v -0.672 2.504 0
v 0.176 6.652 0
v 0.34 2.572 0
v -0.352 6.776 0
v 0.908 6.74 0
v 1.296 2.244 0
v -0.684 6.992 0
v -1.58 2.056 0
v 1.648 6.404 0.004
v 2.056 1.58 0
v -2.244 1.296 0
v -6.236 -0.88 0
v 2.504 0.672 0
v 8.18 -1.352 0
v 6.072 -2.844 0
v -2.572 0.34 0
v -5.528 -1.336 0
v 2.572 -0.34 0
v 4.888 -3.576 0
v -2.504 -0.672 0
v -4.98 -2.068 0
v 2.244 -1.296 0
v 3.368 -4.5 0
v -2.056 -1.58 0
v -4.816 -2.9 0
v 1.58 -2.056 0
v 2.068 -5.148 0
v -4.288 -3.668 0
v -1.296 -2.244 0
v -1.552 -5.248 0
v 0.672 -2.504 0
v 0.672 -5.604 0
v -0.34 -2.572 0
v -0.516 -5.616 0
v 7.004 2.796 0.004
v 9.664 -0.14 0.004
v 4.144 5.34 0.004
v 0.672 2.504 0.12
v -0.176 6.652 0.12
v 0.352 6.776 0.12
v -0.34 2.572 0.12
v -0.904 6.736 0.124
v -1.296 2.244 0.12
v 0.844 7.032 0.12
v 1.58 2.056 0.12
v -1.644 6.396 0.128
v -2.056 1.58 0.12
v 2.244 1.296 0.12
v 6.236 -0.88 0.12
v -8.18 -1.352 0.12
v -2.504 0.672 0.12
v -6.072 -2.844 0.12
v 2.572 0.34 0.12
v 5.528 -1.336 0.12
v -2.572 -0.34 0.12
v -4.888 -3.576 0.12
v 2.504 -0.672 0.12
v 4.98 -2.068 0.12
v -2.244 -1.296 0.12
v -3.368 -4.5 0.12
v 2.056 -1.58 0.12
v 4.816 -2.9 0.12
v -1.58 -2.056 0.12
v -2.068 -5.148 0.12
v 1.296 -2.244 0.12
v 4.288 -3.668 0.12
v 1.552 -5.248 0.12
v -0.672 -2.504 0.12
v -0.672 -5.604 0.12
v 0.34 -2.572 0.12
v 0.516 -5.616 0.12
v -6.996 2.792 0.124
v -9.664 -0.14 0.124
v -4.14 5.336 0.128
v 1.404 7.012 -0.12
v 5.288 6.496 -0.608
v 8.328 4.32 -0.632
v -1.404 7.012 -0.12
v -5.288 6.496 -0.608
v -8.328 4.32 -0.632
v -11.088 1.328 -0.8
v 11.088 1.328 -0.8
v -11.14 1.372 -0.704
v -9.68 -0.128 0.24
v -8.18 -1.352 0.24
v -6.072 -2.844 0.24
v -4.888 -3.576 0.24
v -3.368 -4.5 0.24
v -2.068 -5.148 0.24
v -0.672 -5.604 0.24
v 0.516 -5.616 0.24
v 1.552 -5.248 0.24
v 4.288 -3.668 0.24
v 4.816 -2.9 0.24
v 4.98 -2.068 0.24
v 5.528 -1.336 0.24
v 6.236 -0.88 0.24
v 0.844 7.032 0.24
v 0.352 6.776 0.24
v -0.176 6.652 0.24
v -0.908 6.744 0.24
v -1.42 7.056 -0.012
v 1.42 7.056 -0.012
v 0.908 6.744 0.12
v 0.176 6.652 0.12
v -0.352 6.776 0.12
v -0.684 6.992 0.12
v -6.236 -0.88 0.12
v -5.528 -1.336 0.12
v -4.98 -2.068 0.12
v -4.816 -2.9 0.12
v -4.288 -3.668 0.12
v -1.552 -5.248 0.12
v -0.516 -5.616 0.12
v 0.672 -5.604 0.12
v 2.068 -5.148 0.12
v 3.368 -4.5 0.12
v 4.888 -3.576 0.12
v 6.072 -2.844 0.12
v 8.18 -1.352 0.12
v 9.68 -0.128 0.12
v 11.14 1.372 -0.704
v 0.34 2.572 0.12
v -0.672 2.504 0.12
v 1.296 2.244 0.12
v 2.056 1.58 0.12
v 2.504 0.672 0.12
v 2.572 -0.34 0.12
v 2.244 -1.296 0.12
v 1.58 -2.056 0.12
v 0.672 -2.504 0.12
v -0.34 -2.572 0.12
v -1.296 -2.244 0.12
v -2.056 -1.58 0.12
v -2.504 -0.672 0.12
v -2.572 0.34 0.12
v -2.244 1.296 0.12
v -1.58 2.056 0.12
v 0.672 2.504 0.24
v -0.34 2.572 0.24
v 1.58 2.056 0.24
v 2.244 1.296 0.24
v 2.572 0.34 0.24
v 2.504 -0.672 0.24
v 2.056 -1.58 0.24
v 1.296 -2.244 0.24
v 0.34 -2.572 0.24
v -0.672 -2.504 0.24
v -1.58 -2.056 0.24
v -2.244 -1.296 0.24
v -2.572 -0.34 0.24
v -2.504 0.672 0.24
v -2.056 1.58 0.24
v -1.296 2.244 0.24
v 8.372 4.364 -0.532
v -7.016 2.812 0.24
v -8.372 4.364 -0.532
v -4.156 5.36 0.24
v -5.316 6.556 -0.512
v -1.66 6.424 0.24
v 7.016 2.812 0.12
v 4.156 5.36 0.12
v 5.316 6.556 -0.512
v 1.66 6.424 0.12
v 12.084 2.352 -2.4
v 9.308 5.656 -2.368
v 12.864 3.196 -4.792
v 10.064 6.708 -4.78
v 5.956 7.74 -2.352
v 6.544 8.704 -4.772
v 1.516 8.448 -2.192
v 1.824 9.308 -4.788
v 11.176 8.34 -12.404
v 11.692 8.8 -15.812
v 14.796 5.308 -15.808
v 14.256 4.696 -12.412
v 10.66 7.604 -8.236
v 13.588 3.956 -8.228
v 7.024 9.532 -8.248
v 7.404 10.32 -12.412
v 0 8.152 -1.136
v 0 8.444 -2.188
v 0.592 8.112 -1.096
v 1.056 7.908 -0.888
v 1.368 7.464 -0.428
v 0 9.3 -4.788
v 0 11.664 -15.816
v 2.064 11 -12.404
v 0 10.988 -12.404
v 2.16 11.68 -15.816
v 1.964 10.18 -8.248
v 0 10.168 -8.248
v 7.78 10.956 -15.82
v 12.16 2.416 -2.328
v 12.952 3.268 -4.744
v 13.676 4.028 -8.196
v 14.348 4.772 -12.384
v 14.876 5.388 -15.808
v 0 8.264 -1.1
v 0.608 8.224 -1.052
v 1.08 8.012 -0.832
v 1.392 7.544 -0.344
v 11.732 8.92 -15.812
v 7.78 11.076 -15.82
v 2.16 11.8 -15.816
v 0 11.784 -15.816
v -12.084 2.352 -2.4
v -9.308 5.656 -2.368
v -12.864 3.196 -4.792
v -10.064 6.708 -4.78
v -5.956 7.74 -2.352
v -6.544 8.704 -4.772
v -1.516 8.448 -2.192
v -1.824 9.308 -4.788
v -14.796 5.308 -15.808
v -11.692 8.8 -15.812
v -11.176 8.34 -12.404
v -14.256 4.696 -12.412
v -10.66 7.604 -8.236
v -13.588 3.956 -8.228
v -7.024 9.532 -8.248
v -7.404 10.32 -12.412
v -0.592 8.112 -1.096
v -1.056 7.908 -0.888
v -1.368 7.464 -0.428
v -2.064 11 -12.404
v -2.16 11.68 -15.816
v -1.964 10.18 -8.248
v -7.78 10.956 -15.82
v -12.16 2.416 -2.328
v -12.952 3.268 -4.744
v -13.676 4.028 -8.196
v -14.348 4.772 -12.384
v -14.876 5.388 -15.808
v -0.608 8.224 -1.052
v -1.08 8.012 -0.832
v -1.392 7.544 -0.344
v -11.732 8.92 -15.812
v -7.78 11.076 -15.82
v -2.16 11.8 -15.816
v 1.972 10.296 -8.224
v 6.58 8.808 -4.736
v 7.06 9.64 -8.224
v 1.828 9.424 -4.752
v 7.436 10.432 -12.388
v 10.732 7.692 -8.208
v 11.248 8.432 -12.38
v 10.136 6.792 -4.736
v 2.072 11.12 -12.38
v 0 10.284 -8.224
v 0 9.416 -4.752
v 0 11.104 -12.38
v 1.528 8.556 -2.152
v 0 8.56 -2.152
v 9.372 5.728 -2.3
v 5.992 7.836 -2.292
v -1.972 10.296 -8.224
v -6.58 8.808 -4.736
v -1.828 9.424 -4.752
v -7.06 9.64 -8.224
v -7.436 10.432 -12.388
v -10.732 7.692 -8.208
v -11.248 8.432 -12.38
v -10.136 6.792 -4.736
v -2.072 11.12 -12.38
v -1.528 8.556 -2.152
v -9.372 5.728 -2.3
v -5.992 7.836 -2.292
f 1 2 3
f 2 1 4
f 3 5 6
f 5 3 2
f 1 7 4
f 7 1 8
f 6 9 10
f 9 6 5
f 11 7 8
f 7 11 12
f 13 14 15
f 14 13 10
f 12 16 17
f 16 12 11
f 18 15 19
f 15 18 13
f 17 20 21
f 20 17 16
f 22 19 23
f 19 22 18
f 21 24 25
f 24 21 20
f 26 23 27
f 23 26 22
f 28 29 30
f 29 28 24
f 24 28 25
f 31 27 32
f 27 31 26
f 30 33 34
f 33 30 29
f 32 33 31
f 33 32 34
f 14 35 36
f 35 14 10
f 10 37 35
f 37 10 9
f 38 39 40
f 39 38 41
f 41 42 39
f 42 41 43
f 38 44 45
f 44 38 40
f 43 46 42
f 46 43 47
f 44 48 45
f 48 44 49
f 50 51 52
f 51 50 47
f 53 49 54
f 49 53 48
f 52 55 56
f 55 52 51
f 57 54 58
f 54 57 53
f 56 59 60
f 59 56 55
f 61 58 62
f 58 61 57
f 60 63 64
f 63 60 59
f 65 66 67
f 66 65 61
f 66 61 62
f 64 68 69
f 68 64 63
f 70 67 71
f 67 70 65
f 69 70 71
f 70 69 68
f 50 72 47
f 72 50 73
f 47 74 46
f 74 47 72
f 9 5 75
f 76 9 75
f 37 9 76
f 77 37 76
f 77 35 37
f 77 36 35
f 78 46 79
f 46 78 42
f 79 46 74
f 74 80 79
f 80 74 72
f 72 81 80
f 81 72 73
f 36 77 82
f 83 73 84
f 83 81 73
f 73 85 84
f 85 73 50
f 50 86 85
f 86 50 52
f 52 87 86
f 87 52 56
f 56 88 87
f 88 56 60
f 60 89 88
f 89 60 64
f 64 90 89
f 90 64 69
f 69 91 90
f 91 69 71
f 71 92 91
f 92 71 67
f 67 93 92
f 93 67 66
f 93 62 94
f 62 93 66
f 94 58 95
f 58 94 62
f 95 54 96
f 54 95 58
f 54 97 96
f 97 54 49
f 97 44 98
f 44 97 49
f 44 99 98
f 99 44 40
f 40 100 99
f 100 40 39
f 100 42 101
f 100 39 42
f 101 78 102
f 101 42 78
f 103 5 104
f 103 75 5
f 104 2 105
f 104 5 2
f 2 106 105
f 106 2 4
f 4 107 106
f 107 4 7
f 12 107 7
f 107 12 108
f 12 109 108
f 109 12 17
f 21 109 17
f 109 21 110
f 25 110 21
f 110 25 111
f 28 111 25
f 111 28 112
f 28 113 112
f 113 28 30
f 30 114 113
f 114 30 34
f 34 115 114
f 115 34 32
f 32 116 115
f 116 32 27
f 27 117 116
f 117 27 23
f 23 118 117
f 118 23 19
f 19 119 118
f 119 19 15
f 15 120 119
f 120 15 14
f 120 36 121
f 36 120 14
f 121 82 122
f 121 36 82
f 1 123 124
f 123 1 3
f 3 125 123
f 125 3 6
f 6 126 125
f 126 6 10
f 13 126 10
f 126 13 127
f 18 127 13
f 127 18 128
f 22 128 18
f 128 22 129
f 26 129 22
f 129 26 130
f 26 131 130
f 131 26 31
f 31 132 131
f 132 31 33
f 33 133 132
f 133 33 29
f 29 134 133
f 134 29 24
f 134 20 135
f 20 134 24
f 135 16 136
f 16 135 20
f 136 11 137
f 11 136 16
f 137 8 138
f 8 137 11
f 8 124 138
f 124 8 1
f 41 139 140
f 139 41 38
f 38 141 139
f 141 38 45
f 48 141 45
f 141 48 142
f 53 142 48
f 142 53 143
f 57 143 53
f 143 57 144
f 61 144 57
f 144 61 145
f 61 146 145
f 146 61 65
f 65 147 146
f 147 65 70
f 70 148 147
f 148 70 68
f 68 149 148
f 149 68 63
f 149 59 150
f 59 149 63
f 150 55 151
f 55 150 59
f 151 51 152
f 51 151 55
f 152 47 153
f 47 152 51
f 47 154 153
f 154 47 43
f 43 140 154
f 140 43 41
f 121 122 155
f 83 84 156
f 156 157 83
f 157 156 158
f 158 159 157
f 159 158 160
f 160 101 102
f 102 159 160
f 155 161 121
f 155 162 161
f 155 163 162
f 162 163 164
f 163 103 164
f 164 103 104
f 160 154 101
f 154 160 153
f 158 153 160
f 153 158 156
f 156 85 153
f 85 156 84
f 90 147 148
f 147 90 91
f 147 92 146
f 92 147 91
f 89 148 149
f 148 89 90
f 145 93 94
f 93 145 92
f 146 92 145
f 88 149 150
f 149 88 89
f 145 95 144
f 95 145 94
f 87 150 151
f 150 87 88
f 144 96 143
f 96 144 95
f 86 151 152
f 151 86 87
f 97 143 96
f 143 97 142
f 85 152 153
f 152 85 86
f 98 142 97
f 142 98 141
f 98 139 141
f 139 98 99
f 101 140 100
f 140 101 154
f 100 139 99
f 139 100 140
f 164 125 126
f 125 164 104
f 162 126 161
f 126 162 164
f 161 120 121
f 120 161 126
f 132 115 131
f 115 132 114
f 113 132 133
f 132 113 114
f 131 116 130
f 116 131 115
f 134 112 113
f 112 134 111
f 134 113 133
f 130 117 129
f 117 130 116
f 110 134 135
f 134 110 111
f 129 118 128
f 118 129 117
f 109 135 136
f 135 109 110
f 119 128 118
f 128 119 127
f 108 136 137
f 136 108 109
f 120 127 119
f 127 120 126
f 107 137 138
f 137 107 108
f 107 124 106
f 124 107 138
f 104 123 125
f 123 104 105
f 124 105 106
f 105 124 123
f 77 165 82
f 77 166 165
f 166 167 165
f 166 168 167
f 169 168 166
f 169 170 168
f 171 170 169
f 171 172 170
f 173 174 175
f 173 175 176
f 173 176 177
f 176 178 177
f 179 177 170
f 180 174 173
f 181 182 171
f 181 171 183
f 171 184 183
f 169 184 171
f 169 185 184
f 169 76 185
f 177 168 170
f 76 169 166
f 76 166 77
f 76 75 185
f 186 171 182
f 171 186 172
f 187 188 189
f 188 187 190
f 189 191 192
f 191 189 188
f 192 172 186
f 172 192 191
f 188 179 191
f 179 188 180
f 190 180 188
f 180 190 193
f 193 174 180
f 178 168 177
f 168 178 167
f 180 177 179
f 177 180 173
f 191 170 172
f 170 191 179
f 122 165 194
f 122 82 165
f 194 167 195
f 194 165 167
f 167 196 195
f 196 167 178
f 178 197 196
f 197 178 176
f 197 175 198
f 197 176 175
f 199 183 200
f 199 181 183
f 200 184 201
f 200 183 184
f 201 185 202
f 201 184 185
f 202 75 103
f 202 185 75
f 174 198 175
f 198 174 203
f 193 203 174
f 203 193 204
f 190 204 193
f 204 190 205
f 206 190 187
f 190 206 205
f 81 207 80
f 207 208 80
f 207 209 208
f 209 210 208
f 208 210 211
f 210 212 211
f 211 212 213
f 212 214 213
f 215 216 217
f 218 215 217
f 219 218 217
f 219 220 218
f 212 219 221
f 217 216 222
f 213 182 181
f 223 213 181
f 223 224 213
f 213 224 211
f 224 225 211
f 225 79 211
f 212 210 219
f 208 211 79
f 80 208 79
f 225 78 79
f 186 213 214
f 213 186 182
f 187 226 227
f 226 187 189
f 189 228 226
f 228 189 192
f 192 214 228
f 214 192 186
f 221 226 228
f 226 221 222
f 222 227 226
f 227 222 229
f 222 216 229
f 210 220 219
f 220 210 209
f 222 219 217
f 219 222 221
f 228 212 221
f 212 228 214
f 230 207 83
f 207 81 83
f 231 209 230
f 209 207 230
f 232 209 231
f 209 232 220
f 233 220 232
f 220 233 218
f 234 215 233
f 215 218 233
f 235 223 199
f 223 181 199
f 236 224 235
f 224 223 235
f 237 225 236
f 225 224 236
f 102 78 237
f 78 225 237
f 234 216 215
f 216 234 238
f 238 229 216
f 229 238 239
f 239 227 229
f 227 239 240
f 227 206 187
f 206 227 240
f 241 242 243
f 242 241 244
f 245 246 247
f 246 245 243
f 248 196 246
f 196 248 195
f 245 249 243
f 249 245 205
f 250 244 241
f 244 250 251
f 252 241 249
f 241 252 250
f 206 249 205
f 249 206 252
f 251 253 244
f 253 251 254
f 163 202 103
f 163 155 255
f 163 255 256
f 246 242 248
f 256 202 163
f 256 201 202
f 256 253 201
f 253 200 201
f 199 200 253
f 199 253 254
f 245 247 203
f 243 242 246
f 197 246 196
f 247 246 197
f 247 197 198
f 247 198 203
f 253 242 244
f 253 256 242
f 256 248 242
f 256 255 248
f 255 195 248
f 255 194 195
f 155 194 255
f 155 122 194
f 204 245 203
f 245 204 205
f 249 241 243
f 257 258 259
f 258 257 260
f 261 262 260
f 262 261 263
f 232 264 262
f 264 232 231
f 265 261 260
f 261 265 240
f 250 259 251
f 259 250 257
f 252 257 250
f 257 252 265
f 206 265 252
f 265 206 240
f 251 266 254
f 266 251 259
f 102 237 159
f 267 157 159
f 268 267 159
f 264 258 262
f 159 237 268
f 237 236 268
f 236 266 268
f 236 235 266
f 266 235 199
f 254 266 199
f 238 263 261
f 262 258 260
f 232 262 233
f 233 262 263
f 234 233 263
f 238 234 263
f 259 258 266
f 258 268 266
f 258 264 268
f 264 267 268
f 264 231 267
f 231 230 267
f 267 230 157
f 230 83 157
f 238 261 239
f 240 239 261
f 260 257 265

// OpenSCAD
use <../lib.scad>
use <s/50231s01.scad>
use <s/50231s02.scad>
use <s/99464s01.scad>
use <s/99464s02.scad>
function ldraw_lib__99464c01() = [
// 0 Minifig Cape Cloth Short (Formed)
// 0 Name: 99464c01.dat
// 0 Author: Philippe Hurbain [Philo]
// 0 !LDRAW_ORG Part UPDATE 2019-01
// 0 !LICENSE Licensed under CC BY 2.0 and CC BY 4.0 : see CAreadme.txt
// 
// 0 !HELP Place at y = 0 on torso, head at y = -0.6
// 
// 0 BFC CERTIFY CCW
  [0,"BFC","CERTIFY"],
  [0,"BFC","CCW"],
// 
// 0 !CATEGORY Minifig Neckwear
// 0 !KEYWORDS Cloak, Drape, Neckwear, Poncho, Shawl
// 
// 0 !HISTORY 2014-12-23 [PTadmin] Official Update 2014-02
// 0 !HISTORY 2019-01-26 [cwdee] Update category
// 0 !HISTORY 2019-06-28 [PTadmin] Official Update 2019-01
// 
// 
// 1 16 0 0 0 1 0 0 0 1 0 0 0 1 s\50231s01.dat
  [1,16,0,0,0,1,0,0,0,1,0,0,0,1, ldraw_lib__s__50231s01()],
// 1 16 0 0 0 1 0 0 0 1 0 0 0 1 s\50231s02.dat
  [1,16,0,0,0,1,0,0,0,1,0,0,0,1, ldraw_lib__s__50231s02()],
// 1 16 0 0 0 1 0 0 0 1 0 0 0 1 s\99464s01.dat
  [1,16,0,0,0,1,0,0,0,1,0,0,0,1, ldraw_lib__s__99464s01()],
// 1 16 0 0 0 -1 0 0 0 1 0 0 0 1 s\99464s01.dat
  [1,16,0,0,0,-1,0,0,0,1,0,0,0,1, ldraw_lib__s__99464s01()],
// 1 16 0 0 0 1 0 0 0 1 0 0 0 1 s\99464s02.dat
  [1,16,0,0,0,1,0,0,0,1,0,0,0,1, ldraw_lib__s__99464s02()],
// 1 16 0 0 0 -1 0 0 0 1 0 0 0 1 s\99464s02.dat
  [1,16,0,0,0,-1,0,0,0,1,0,0,0,1, ldraw_lib__s__99464s02()],
];
makepoly(ldraw_lib__99464c01(), line=0.2);
